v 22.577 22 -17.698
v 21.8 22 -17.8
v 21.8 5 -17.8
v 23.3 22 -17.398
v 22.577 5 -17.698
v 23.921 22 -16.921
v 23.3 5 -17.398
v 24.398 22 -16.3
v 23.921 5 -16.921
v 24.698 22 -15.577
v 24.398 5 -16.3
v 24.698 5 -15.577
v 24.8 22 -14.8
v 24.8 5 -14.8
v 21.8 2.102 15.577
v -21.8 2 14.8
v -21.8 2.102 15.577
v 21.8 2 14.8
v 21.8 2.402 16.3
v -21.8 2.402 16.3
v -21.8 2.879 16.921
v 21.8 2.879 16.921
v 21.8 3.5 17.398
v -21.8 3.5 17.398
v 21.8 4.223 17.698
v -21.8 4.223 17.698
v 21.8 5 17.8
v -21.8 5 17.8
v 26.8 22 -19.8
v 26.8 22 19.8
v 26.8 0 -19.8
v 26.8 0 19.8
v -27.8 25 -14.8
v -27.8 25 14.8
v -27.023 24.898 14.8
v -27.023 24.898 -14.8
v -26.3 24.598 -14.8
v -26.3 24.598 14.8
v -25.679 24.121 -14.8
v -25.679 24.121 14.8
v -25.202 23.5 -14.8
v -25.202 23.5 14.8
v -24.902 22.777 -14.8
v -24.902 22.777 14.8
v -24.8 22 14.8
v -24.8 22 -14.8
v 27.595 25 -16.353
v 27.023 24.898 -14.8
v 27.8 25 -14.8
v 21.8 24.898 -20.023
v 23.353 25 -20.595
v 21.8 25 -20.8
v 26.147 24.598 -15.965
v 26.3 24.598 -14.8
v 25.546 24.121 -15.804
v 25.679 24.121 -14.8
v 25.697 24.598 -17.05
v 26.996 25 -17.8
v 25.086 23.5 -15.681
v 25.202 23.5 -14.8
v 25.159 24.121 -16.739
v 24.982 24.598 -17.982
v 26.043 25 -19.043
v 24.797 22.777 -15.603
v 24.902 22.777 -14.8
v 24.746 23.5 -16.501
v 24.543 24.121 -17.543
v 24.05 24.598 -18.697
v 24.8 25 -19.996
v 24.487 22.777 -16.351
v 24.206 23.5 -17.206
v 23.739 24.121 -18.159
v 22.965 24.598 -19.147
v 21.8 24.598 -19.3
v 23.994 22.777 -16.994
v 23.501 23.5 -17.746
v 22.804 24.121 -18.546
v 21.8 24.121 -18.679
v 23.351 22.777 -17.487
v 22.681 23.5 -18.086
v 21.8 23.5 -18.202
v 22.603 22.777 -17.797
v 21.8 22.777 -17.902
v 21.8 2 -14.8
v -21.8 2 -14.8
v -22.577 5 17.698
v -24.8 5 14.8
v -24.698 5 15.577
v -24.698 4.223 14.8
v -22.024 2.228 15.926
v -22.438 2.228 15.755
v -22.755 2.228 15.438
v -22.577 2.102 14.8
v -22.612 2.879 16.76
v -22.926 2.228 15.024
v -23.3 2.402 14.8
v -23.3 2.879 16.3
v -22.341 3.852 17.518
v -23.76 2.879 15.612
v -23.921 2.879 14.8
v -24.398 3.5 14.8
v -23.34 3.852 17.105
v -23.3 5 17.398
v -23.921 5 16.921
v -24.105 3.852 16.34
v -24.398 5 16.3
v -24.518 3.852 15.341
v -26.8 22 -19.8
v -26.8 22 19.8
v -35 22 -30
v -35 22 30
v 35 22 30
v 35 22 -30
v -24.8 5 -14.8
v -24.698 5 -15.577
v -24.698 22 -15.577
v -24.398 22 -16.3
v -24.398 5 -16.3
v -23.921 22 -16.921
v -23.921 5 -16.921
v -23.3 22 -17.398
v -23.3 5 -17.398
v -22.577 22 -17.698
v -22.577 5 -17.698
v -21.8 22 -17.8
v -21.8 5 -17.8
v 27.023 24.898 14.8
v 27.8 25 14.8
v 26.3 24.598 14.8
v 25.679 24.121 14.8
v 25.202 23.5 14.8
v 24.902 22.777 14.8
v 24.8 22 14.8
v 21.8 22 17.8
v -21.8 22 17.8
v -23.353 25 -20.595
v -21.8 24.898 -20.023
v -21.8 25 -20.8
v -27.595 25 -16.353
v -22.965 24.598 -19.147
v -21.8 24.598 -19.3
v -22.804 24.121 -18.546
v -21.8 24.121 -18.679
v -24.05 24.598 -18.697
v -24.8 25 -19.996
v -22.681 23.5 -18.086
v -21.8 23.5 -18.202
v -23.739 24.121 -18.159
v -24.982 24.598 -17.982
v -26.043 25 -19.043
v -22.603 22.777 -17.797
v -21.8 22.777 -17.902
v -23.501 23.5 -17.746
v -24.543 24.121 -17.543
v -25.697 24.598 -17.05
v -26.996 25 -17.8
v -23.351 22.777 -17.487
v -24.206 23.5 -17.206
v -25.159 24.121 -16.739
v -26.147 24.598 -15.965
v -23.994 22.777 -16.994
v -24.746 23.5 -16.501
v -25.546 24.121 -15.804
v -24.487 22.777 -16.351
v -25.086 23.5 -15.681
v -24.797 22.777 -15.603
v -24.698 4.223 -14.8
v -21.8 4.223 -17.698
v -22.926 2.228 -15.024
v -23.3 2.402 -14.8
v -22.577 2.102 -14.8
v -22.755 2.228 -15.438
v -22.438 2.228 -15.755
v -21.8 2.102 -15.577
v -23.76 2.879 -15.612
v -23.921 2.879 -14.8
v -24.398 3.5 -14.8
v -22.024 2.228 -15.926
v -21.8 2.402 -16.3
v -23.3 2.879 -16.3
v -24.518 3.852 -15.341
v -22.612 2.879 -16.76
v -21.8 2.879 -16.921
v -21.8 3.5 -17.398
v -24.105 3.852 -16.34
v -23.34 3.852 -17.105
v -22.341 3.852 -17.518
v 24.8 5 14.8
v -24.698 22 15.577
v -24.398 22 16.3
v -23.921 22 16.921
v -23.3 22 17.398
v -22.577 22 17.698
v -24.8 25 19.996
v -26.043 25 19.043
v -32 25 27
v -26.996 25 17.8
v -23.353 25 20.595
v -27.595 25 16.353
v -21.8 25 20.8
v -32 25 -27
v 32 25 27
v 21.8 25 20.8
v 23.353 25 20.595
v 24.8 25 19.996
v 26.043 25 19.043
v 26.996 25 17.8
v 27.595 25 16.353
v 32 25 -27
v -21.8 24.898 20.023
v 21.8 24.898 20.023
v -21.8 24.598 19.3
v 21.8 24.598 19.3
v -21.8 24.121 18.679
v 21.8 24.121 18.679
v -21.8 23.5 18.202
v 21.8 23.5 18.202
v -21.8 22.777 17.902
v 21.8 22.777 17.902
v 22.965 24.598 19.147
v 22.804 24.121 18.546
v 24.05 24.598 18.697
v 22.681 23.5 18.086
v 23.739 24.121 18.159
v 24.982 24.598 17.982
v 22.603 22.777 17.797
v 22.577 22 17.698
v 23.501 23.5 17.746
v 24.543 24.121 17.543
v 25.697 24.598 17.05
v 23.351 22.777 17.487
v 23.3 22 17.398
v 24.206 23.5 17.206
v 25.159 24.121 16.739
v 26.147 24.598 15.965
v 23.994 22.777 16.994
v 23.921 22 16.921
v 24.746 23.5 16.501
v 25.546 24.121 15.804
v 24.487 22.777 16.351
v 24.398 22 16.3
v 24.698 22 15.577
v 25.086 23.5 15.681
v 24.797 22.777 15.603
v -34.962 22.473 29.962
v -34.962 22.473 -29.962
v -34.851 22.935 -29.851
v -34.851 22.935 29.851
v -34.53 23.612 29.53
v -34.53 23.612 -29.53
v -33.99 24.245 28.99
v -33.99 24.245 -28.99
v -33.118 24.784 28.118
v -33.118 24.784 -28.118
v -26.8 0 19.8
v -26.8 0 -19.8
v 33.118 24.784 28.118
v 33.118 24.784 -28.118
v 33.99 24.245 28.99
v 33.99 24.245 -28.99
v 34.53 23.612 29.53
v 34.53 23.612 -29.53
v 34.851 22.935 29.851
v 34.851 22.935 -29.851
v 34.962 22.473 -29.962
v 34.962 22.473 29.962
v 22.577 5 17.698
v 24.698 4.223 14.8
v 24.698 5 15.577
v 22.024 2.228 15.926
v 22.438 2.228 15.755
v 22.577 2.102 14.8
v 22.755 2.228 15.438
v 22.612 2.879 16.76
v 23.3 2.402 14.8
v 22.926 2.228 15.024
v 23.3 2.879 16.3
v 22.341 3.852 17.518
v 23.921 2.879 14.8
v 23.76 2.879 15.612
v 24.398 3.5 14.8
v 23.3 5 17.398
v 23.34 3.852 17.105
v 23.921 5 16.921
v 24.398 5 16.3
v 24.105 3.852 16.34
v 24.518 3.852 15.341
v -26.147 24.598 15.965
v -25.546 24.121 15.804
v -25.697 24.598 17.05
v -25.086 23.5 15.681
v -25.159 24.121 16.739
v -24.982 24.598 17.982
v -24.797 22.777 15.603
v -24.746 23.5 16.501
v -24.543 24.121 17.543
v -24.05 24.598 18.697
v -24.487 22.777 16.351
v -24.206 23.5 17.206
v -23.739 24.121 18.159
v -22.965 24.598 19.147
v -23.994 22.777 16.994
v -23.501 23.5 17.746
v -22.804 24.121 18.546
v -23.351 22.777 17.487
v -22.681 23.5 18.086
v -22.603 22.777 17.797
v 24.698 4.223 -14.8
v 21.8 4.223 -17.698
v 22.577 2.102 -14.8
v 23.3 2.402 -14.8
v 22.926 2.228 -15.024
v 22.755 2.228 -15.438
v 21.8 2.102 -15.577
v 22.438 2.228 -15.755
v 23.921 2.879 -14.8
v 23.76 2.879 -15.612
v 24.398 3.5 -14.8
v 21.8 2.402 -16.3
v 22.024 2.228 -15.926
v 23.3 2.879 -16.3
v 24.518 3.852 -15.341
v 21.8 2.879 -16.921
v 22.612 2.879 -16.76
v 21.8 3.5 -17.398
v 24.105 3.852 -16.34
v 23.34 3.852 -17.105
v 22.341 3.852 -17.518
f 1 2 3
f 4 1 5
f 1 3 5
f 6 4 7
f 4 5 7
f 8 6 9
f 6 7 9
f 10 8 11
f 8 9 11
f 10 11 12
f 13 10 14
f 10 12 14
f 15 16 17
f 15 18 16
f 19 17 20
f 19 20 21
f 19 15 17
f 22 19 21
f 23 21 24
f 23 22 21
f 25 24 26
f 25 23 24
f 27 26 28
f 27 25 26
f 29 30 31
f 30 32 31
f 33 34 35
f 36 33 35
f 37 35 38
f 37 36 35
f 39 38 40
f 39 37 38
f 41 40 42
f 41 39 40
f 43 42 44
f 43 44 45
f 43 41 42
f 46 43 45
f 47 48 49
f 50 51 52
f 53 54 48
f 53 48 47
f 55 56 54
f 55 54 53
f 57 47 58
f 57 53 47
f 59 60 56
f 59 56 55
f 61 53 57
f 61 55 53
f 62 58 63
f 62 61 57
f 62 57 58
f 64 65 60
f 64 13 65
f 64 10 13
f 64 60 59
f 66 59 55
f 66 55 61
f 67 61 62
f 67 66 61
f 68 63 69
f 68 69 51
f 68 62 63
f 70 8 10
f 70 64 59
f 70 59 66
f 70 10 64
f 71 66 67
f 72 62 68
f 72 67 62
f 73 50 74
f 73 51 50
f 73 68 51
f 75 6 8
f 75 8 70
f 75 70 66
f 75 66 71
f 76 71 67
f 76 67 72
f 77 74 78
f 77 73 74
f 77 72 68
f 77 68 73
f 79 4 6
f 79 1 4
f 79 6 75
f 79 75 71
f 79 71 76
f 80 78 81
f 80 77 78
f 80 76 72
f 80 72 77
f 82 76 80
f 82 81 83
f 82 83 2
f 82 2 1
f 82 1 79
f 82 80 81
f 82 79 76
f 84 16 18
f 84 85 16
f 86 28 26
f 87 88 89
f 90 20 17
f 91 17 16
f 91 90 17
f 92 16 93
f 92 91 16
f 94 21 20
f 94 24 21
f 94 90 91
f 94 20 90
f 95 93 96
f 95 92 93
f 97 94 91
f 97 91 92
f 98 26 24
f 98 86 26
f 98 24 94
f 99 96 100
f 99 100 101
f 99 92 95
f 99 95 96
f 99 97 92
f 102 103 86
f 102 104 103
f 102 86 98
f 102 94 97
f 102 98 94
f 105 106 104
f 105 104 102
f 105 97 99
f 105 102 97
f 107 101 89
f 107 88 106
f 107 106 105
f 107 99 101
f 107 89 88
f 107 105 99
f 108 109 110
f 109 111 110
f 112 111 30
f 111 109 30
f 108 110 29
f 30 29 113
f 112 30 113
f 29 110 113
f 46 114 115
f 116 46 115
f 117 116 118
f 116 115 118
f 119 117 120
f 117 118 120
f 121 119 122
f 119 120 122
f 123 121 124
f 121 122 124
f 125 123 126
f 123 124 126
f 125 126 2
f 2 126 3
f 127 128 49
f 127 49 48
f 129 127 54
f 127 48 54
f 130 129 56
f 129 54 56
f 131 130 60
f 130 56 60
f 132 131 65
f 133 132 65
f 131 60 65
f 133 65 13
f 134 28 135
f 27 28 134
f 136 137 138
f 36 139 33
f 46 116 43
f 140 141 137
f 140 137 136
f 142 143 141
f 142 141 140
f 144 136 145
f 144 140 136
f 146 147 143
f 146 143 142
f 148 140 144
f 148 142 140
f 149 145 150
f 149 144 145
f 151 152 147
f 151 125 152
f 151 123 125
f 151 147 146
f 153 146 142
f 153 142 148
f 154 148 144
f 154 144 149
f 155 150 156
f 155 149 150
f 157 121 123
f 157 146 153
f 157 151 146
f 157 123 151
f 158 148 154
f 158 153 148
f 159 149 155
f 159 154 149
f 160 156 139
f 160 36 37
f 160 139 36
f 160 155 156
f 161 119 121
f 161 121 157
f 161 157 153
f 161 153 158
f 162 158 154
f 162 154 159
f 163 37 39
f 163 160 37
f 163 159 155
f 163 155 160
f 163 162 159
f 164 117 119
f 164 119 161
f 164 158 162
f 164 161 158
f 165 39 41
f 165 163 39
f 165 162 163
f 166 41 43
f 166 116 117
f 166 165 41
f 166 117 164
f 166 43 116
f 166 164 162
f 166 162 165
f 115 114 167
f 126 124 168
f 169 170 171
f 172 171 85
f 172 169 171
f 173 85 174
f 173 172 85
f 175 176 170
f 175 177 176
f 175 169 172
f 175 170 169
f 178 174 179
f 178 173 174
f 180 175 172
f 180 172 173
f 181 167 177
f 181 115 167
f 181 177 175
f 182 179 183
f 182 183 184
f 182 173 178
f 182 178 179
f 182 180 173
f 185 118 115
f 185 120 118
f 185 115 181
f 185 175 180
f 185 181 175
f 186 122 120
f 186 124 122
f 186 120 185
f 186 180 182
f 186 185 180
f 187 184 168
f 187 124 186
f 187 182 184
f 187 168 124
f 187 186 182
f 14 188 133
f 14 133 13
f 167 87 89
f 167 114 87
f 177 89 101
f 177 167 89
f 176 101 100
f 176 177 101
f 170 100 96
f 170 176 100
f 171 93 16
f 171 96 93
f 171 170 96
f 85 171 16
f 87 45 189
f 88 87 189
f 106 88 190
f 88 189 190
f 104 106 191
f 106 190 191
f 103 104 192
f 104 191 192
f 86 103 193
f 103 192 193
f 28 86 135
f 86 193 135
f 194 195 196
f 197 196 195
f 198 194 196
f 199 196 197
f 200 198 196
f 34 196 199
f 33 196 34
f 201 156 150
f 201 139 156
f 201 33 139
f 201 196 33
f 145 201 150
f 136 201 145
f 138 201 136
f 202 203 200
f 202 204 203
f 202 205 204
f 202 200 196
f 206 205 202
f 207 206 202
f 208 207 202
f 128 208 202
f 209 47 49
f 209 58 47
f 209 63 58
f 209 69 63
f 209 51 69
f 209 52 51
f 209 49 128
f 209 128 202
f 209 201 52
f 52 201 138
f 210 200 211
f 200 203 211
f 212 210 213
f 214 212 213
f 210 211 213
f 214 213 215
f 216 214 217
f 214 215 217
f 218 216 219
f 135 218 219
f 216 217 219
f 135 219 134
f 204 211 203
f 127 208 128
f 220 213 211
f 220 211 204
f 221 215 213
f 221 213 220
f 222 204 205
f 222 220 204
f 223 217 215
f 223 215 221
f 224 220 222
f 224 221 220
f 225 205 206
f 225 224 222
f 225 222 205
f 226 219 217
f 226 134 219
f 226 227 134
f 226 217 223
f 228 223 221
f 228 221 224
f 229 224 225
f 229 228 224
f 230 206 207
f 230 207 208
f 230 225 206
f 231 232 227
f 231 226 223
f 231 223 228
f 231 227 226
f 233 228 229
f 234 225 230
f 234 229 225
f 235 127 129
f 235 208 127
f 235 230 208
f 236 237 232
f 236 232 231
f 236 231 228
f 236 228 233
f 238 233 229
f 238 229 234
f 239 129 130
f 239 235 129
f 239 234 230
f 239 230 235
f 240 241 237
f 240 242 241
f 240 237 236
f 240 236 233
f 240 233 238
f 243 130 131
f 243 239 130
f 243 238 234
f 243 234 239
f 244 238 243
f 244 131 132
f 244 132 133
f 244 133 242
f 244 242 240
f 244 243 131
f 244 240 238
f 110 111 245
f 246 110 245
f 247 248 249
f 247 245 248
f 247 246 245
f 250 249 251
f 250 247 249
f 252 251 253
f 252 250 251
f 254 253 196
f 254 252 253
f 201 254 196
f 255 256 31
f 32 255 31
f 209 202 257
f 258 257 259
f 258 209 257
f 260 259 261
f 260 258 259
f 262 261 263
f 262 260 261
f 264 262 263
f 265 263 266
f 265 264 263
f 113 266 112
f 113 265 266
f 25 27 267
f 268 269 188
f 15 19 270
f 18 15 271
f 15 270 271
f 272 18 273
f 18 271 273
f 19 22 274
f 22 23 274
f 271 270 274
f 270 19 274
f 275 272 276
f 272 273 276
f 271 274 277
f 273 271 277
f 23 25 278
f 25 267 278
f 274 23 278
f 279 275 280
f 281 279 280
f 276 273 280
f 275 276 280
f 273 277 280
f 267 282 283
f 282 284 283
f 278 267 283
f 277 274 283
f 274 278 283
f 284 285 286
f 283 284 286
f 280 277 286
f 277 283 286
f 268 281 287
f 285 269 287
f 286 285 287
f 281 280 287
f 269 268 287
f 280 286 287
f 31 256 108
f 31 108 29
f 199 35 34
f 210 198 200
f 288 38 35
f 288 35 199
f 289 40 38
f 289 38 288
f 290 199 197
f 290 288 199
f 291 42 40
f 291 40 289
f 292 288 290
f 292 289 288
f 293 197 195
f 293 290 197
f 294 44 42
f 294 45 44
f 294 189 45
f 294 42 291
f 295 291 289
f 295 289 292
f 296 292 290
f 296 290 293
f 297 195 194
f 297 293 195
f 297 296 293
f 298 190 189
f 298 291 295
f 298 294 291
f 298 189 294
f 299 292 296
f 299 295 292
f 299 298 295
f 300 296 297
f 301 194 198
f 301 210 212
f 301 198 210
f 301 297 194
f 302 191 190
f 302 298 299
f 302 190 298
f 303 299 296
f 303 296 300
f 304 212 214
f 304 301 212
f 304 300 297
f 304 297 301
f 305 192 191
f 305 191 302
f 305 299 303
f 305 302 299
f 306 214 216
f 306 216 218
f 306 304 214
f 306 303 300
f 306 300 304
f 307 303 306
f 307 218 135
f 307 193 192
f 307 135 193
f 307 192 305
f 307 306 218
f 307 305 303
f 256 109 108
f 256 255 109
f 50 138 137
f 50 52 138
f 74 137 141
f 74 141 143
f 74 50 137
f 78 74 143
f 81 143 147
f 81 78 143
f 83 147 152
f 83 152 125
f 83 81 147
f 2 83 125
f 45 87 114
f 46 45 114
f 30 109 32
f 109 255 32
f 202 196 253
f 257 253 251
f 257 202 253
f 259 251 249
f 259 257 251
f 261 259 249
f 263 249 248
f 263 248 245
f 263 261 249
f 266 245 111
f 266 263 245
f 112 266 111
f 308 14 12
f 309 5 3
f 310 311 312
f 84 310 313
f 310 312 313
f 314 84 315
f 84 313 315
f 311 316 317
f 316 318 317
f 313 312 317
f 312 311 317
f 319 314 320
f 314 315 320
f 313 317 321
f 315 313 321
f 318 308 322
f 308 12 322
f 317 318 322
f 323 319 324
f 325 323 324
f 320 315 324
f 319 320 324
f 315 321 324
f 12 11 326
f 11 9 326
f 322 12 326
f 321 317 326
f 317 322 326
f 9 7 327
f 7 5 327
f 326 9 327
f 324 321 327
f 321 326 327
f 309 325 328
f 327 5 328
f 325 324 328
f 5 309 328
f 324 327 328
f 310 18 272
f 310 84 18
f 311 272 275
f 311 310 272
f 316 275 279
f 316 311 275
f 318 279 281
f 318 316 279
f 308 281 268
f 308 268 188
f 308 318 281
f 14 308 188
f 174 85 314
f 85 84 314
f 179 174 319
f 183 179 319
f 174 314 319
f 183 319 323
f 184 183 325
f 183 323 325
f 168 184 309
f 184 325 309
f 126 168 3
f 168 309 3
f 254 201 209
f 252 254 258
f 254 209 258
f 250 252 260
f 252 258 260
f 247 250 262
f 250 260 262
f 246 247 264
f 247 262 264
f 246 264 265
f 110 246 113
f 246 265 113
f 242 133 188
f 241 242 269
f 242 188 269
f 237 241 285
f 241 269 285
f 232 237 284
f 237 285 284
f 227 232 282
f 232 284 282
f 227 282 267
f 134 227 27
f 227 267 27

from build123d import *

# Parameters (mm, degrees)
SKETCH1_W           = 53.6
SKETCH1_H           = 39.6
BOSS_EXTRUDE1_DEPTH = 2
SKETCH2_W           = 53.6
SKETCH2_H           = 39.6
SKETCH2_W_2         = 49.6
SKETCH2_H_2         = 35.6
BOSS_EXTRUDE2_DEPTH = 20
SKETCH3_W           = 70
SKETCH3_H           = 60
SKETCH3_W_2         = 49.6
SKETCH3_H_2         = 35.6
BOSS_EXTRUDE3_DEPTH = 3
FILLET1_R           = 3


with BuildPart() as part:
    # Sketch1 → Boss-Extrude1 (new body)
    with BuildSketch(Plane(origin=(0, 0, 0), x_dir=(1, 0, 0), z_dir=(0, 1, 0))):
        Rectangle(SKETCH1_W, SKETCH1_H)
    extrude(amount=BOSS_EXTRUDE1_DEPTH)

    # Sketch2 → Boss-Extrude2 (add)
    with BuildSketch(Plane(origin=(0, 2, 0), x_dir=(1, 0, 0), z_dir=(0, 1, 0))):
        Rectangle(SKETCH2_W, SKETCH2_H)
        Rectangle(SKETCH2_W_2, SKETCH2_H_2, mode=Mode.SUBTRACT)
    extrude(amount=BOSS_EXTRUDE2_DEPTH)

    # Sketch3 → Boss-Extrude3 (add)
    with BuildSketch(Plane(origin=(0, 22, 0), x_dir=(1, 0, 0), z_dir=(0, 1, 0))):
        Rectangle(SKETCH3_W, SKETCH3_H)
        Rectangle(SKETCH3_W_2, SKETCH3_H_2, mode=Mode.SUBTRACT)
    extrude(amount=BOSS_EXTRUDE3_DEPTH)

    # Fillet1
    fillet1_edges = [part.edges().sort_by_distance(p)[0] for p in [
        (24.8, 13.5, 17.8),
        (0, 25, 17.8),
        (-24.8, 13.5, 17.8),
        (0, 2, 17.8),
        (24.8, 13.5, -17.8),
        (-24.8, 13.5, -17.8),
        (24.8, 2, 0),
        (-24.8, 2, 0),
        (0, 2, -17.8),
        (24.8, 25, 0),
        (0, 25, -17.8),
        (-24.8, 25, 0),
        (0, 25, 30),
        (0, 25, -30),
        (35, 25, 0),
        (-35, 25, 0),
    ]]
    fillet(fillet1_edges, radius=FILLET1_R - 0.0001)  # a hair under: the kernel refuses the full size


solid = part.part
